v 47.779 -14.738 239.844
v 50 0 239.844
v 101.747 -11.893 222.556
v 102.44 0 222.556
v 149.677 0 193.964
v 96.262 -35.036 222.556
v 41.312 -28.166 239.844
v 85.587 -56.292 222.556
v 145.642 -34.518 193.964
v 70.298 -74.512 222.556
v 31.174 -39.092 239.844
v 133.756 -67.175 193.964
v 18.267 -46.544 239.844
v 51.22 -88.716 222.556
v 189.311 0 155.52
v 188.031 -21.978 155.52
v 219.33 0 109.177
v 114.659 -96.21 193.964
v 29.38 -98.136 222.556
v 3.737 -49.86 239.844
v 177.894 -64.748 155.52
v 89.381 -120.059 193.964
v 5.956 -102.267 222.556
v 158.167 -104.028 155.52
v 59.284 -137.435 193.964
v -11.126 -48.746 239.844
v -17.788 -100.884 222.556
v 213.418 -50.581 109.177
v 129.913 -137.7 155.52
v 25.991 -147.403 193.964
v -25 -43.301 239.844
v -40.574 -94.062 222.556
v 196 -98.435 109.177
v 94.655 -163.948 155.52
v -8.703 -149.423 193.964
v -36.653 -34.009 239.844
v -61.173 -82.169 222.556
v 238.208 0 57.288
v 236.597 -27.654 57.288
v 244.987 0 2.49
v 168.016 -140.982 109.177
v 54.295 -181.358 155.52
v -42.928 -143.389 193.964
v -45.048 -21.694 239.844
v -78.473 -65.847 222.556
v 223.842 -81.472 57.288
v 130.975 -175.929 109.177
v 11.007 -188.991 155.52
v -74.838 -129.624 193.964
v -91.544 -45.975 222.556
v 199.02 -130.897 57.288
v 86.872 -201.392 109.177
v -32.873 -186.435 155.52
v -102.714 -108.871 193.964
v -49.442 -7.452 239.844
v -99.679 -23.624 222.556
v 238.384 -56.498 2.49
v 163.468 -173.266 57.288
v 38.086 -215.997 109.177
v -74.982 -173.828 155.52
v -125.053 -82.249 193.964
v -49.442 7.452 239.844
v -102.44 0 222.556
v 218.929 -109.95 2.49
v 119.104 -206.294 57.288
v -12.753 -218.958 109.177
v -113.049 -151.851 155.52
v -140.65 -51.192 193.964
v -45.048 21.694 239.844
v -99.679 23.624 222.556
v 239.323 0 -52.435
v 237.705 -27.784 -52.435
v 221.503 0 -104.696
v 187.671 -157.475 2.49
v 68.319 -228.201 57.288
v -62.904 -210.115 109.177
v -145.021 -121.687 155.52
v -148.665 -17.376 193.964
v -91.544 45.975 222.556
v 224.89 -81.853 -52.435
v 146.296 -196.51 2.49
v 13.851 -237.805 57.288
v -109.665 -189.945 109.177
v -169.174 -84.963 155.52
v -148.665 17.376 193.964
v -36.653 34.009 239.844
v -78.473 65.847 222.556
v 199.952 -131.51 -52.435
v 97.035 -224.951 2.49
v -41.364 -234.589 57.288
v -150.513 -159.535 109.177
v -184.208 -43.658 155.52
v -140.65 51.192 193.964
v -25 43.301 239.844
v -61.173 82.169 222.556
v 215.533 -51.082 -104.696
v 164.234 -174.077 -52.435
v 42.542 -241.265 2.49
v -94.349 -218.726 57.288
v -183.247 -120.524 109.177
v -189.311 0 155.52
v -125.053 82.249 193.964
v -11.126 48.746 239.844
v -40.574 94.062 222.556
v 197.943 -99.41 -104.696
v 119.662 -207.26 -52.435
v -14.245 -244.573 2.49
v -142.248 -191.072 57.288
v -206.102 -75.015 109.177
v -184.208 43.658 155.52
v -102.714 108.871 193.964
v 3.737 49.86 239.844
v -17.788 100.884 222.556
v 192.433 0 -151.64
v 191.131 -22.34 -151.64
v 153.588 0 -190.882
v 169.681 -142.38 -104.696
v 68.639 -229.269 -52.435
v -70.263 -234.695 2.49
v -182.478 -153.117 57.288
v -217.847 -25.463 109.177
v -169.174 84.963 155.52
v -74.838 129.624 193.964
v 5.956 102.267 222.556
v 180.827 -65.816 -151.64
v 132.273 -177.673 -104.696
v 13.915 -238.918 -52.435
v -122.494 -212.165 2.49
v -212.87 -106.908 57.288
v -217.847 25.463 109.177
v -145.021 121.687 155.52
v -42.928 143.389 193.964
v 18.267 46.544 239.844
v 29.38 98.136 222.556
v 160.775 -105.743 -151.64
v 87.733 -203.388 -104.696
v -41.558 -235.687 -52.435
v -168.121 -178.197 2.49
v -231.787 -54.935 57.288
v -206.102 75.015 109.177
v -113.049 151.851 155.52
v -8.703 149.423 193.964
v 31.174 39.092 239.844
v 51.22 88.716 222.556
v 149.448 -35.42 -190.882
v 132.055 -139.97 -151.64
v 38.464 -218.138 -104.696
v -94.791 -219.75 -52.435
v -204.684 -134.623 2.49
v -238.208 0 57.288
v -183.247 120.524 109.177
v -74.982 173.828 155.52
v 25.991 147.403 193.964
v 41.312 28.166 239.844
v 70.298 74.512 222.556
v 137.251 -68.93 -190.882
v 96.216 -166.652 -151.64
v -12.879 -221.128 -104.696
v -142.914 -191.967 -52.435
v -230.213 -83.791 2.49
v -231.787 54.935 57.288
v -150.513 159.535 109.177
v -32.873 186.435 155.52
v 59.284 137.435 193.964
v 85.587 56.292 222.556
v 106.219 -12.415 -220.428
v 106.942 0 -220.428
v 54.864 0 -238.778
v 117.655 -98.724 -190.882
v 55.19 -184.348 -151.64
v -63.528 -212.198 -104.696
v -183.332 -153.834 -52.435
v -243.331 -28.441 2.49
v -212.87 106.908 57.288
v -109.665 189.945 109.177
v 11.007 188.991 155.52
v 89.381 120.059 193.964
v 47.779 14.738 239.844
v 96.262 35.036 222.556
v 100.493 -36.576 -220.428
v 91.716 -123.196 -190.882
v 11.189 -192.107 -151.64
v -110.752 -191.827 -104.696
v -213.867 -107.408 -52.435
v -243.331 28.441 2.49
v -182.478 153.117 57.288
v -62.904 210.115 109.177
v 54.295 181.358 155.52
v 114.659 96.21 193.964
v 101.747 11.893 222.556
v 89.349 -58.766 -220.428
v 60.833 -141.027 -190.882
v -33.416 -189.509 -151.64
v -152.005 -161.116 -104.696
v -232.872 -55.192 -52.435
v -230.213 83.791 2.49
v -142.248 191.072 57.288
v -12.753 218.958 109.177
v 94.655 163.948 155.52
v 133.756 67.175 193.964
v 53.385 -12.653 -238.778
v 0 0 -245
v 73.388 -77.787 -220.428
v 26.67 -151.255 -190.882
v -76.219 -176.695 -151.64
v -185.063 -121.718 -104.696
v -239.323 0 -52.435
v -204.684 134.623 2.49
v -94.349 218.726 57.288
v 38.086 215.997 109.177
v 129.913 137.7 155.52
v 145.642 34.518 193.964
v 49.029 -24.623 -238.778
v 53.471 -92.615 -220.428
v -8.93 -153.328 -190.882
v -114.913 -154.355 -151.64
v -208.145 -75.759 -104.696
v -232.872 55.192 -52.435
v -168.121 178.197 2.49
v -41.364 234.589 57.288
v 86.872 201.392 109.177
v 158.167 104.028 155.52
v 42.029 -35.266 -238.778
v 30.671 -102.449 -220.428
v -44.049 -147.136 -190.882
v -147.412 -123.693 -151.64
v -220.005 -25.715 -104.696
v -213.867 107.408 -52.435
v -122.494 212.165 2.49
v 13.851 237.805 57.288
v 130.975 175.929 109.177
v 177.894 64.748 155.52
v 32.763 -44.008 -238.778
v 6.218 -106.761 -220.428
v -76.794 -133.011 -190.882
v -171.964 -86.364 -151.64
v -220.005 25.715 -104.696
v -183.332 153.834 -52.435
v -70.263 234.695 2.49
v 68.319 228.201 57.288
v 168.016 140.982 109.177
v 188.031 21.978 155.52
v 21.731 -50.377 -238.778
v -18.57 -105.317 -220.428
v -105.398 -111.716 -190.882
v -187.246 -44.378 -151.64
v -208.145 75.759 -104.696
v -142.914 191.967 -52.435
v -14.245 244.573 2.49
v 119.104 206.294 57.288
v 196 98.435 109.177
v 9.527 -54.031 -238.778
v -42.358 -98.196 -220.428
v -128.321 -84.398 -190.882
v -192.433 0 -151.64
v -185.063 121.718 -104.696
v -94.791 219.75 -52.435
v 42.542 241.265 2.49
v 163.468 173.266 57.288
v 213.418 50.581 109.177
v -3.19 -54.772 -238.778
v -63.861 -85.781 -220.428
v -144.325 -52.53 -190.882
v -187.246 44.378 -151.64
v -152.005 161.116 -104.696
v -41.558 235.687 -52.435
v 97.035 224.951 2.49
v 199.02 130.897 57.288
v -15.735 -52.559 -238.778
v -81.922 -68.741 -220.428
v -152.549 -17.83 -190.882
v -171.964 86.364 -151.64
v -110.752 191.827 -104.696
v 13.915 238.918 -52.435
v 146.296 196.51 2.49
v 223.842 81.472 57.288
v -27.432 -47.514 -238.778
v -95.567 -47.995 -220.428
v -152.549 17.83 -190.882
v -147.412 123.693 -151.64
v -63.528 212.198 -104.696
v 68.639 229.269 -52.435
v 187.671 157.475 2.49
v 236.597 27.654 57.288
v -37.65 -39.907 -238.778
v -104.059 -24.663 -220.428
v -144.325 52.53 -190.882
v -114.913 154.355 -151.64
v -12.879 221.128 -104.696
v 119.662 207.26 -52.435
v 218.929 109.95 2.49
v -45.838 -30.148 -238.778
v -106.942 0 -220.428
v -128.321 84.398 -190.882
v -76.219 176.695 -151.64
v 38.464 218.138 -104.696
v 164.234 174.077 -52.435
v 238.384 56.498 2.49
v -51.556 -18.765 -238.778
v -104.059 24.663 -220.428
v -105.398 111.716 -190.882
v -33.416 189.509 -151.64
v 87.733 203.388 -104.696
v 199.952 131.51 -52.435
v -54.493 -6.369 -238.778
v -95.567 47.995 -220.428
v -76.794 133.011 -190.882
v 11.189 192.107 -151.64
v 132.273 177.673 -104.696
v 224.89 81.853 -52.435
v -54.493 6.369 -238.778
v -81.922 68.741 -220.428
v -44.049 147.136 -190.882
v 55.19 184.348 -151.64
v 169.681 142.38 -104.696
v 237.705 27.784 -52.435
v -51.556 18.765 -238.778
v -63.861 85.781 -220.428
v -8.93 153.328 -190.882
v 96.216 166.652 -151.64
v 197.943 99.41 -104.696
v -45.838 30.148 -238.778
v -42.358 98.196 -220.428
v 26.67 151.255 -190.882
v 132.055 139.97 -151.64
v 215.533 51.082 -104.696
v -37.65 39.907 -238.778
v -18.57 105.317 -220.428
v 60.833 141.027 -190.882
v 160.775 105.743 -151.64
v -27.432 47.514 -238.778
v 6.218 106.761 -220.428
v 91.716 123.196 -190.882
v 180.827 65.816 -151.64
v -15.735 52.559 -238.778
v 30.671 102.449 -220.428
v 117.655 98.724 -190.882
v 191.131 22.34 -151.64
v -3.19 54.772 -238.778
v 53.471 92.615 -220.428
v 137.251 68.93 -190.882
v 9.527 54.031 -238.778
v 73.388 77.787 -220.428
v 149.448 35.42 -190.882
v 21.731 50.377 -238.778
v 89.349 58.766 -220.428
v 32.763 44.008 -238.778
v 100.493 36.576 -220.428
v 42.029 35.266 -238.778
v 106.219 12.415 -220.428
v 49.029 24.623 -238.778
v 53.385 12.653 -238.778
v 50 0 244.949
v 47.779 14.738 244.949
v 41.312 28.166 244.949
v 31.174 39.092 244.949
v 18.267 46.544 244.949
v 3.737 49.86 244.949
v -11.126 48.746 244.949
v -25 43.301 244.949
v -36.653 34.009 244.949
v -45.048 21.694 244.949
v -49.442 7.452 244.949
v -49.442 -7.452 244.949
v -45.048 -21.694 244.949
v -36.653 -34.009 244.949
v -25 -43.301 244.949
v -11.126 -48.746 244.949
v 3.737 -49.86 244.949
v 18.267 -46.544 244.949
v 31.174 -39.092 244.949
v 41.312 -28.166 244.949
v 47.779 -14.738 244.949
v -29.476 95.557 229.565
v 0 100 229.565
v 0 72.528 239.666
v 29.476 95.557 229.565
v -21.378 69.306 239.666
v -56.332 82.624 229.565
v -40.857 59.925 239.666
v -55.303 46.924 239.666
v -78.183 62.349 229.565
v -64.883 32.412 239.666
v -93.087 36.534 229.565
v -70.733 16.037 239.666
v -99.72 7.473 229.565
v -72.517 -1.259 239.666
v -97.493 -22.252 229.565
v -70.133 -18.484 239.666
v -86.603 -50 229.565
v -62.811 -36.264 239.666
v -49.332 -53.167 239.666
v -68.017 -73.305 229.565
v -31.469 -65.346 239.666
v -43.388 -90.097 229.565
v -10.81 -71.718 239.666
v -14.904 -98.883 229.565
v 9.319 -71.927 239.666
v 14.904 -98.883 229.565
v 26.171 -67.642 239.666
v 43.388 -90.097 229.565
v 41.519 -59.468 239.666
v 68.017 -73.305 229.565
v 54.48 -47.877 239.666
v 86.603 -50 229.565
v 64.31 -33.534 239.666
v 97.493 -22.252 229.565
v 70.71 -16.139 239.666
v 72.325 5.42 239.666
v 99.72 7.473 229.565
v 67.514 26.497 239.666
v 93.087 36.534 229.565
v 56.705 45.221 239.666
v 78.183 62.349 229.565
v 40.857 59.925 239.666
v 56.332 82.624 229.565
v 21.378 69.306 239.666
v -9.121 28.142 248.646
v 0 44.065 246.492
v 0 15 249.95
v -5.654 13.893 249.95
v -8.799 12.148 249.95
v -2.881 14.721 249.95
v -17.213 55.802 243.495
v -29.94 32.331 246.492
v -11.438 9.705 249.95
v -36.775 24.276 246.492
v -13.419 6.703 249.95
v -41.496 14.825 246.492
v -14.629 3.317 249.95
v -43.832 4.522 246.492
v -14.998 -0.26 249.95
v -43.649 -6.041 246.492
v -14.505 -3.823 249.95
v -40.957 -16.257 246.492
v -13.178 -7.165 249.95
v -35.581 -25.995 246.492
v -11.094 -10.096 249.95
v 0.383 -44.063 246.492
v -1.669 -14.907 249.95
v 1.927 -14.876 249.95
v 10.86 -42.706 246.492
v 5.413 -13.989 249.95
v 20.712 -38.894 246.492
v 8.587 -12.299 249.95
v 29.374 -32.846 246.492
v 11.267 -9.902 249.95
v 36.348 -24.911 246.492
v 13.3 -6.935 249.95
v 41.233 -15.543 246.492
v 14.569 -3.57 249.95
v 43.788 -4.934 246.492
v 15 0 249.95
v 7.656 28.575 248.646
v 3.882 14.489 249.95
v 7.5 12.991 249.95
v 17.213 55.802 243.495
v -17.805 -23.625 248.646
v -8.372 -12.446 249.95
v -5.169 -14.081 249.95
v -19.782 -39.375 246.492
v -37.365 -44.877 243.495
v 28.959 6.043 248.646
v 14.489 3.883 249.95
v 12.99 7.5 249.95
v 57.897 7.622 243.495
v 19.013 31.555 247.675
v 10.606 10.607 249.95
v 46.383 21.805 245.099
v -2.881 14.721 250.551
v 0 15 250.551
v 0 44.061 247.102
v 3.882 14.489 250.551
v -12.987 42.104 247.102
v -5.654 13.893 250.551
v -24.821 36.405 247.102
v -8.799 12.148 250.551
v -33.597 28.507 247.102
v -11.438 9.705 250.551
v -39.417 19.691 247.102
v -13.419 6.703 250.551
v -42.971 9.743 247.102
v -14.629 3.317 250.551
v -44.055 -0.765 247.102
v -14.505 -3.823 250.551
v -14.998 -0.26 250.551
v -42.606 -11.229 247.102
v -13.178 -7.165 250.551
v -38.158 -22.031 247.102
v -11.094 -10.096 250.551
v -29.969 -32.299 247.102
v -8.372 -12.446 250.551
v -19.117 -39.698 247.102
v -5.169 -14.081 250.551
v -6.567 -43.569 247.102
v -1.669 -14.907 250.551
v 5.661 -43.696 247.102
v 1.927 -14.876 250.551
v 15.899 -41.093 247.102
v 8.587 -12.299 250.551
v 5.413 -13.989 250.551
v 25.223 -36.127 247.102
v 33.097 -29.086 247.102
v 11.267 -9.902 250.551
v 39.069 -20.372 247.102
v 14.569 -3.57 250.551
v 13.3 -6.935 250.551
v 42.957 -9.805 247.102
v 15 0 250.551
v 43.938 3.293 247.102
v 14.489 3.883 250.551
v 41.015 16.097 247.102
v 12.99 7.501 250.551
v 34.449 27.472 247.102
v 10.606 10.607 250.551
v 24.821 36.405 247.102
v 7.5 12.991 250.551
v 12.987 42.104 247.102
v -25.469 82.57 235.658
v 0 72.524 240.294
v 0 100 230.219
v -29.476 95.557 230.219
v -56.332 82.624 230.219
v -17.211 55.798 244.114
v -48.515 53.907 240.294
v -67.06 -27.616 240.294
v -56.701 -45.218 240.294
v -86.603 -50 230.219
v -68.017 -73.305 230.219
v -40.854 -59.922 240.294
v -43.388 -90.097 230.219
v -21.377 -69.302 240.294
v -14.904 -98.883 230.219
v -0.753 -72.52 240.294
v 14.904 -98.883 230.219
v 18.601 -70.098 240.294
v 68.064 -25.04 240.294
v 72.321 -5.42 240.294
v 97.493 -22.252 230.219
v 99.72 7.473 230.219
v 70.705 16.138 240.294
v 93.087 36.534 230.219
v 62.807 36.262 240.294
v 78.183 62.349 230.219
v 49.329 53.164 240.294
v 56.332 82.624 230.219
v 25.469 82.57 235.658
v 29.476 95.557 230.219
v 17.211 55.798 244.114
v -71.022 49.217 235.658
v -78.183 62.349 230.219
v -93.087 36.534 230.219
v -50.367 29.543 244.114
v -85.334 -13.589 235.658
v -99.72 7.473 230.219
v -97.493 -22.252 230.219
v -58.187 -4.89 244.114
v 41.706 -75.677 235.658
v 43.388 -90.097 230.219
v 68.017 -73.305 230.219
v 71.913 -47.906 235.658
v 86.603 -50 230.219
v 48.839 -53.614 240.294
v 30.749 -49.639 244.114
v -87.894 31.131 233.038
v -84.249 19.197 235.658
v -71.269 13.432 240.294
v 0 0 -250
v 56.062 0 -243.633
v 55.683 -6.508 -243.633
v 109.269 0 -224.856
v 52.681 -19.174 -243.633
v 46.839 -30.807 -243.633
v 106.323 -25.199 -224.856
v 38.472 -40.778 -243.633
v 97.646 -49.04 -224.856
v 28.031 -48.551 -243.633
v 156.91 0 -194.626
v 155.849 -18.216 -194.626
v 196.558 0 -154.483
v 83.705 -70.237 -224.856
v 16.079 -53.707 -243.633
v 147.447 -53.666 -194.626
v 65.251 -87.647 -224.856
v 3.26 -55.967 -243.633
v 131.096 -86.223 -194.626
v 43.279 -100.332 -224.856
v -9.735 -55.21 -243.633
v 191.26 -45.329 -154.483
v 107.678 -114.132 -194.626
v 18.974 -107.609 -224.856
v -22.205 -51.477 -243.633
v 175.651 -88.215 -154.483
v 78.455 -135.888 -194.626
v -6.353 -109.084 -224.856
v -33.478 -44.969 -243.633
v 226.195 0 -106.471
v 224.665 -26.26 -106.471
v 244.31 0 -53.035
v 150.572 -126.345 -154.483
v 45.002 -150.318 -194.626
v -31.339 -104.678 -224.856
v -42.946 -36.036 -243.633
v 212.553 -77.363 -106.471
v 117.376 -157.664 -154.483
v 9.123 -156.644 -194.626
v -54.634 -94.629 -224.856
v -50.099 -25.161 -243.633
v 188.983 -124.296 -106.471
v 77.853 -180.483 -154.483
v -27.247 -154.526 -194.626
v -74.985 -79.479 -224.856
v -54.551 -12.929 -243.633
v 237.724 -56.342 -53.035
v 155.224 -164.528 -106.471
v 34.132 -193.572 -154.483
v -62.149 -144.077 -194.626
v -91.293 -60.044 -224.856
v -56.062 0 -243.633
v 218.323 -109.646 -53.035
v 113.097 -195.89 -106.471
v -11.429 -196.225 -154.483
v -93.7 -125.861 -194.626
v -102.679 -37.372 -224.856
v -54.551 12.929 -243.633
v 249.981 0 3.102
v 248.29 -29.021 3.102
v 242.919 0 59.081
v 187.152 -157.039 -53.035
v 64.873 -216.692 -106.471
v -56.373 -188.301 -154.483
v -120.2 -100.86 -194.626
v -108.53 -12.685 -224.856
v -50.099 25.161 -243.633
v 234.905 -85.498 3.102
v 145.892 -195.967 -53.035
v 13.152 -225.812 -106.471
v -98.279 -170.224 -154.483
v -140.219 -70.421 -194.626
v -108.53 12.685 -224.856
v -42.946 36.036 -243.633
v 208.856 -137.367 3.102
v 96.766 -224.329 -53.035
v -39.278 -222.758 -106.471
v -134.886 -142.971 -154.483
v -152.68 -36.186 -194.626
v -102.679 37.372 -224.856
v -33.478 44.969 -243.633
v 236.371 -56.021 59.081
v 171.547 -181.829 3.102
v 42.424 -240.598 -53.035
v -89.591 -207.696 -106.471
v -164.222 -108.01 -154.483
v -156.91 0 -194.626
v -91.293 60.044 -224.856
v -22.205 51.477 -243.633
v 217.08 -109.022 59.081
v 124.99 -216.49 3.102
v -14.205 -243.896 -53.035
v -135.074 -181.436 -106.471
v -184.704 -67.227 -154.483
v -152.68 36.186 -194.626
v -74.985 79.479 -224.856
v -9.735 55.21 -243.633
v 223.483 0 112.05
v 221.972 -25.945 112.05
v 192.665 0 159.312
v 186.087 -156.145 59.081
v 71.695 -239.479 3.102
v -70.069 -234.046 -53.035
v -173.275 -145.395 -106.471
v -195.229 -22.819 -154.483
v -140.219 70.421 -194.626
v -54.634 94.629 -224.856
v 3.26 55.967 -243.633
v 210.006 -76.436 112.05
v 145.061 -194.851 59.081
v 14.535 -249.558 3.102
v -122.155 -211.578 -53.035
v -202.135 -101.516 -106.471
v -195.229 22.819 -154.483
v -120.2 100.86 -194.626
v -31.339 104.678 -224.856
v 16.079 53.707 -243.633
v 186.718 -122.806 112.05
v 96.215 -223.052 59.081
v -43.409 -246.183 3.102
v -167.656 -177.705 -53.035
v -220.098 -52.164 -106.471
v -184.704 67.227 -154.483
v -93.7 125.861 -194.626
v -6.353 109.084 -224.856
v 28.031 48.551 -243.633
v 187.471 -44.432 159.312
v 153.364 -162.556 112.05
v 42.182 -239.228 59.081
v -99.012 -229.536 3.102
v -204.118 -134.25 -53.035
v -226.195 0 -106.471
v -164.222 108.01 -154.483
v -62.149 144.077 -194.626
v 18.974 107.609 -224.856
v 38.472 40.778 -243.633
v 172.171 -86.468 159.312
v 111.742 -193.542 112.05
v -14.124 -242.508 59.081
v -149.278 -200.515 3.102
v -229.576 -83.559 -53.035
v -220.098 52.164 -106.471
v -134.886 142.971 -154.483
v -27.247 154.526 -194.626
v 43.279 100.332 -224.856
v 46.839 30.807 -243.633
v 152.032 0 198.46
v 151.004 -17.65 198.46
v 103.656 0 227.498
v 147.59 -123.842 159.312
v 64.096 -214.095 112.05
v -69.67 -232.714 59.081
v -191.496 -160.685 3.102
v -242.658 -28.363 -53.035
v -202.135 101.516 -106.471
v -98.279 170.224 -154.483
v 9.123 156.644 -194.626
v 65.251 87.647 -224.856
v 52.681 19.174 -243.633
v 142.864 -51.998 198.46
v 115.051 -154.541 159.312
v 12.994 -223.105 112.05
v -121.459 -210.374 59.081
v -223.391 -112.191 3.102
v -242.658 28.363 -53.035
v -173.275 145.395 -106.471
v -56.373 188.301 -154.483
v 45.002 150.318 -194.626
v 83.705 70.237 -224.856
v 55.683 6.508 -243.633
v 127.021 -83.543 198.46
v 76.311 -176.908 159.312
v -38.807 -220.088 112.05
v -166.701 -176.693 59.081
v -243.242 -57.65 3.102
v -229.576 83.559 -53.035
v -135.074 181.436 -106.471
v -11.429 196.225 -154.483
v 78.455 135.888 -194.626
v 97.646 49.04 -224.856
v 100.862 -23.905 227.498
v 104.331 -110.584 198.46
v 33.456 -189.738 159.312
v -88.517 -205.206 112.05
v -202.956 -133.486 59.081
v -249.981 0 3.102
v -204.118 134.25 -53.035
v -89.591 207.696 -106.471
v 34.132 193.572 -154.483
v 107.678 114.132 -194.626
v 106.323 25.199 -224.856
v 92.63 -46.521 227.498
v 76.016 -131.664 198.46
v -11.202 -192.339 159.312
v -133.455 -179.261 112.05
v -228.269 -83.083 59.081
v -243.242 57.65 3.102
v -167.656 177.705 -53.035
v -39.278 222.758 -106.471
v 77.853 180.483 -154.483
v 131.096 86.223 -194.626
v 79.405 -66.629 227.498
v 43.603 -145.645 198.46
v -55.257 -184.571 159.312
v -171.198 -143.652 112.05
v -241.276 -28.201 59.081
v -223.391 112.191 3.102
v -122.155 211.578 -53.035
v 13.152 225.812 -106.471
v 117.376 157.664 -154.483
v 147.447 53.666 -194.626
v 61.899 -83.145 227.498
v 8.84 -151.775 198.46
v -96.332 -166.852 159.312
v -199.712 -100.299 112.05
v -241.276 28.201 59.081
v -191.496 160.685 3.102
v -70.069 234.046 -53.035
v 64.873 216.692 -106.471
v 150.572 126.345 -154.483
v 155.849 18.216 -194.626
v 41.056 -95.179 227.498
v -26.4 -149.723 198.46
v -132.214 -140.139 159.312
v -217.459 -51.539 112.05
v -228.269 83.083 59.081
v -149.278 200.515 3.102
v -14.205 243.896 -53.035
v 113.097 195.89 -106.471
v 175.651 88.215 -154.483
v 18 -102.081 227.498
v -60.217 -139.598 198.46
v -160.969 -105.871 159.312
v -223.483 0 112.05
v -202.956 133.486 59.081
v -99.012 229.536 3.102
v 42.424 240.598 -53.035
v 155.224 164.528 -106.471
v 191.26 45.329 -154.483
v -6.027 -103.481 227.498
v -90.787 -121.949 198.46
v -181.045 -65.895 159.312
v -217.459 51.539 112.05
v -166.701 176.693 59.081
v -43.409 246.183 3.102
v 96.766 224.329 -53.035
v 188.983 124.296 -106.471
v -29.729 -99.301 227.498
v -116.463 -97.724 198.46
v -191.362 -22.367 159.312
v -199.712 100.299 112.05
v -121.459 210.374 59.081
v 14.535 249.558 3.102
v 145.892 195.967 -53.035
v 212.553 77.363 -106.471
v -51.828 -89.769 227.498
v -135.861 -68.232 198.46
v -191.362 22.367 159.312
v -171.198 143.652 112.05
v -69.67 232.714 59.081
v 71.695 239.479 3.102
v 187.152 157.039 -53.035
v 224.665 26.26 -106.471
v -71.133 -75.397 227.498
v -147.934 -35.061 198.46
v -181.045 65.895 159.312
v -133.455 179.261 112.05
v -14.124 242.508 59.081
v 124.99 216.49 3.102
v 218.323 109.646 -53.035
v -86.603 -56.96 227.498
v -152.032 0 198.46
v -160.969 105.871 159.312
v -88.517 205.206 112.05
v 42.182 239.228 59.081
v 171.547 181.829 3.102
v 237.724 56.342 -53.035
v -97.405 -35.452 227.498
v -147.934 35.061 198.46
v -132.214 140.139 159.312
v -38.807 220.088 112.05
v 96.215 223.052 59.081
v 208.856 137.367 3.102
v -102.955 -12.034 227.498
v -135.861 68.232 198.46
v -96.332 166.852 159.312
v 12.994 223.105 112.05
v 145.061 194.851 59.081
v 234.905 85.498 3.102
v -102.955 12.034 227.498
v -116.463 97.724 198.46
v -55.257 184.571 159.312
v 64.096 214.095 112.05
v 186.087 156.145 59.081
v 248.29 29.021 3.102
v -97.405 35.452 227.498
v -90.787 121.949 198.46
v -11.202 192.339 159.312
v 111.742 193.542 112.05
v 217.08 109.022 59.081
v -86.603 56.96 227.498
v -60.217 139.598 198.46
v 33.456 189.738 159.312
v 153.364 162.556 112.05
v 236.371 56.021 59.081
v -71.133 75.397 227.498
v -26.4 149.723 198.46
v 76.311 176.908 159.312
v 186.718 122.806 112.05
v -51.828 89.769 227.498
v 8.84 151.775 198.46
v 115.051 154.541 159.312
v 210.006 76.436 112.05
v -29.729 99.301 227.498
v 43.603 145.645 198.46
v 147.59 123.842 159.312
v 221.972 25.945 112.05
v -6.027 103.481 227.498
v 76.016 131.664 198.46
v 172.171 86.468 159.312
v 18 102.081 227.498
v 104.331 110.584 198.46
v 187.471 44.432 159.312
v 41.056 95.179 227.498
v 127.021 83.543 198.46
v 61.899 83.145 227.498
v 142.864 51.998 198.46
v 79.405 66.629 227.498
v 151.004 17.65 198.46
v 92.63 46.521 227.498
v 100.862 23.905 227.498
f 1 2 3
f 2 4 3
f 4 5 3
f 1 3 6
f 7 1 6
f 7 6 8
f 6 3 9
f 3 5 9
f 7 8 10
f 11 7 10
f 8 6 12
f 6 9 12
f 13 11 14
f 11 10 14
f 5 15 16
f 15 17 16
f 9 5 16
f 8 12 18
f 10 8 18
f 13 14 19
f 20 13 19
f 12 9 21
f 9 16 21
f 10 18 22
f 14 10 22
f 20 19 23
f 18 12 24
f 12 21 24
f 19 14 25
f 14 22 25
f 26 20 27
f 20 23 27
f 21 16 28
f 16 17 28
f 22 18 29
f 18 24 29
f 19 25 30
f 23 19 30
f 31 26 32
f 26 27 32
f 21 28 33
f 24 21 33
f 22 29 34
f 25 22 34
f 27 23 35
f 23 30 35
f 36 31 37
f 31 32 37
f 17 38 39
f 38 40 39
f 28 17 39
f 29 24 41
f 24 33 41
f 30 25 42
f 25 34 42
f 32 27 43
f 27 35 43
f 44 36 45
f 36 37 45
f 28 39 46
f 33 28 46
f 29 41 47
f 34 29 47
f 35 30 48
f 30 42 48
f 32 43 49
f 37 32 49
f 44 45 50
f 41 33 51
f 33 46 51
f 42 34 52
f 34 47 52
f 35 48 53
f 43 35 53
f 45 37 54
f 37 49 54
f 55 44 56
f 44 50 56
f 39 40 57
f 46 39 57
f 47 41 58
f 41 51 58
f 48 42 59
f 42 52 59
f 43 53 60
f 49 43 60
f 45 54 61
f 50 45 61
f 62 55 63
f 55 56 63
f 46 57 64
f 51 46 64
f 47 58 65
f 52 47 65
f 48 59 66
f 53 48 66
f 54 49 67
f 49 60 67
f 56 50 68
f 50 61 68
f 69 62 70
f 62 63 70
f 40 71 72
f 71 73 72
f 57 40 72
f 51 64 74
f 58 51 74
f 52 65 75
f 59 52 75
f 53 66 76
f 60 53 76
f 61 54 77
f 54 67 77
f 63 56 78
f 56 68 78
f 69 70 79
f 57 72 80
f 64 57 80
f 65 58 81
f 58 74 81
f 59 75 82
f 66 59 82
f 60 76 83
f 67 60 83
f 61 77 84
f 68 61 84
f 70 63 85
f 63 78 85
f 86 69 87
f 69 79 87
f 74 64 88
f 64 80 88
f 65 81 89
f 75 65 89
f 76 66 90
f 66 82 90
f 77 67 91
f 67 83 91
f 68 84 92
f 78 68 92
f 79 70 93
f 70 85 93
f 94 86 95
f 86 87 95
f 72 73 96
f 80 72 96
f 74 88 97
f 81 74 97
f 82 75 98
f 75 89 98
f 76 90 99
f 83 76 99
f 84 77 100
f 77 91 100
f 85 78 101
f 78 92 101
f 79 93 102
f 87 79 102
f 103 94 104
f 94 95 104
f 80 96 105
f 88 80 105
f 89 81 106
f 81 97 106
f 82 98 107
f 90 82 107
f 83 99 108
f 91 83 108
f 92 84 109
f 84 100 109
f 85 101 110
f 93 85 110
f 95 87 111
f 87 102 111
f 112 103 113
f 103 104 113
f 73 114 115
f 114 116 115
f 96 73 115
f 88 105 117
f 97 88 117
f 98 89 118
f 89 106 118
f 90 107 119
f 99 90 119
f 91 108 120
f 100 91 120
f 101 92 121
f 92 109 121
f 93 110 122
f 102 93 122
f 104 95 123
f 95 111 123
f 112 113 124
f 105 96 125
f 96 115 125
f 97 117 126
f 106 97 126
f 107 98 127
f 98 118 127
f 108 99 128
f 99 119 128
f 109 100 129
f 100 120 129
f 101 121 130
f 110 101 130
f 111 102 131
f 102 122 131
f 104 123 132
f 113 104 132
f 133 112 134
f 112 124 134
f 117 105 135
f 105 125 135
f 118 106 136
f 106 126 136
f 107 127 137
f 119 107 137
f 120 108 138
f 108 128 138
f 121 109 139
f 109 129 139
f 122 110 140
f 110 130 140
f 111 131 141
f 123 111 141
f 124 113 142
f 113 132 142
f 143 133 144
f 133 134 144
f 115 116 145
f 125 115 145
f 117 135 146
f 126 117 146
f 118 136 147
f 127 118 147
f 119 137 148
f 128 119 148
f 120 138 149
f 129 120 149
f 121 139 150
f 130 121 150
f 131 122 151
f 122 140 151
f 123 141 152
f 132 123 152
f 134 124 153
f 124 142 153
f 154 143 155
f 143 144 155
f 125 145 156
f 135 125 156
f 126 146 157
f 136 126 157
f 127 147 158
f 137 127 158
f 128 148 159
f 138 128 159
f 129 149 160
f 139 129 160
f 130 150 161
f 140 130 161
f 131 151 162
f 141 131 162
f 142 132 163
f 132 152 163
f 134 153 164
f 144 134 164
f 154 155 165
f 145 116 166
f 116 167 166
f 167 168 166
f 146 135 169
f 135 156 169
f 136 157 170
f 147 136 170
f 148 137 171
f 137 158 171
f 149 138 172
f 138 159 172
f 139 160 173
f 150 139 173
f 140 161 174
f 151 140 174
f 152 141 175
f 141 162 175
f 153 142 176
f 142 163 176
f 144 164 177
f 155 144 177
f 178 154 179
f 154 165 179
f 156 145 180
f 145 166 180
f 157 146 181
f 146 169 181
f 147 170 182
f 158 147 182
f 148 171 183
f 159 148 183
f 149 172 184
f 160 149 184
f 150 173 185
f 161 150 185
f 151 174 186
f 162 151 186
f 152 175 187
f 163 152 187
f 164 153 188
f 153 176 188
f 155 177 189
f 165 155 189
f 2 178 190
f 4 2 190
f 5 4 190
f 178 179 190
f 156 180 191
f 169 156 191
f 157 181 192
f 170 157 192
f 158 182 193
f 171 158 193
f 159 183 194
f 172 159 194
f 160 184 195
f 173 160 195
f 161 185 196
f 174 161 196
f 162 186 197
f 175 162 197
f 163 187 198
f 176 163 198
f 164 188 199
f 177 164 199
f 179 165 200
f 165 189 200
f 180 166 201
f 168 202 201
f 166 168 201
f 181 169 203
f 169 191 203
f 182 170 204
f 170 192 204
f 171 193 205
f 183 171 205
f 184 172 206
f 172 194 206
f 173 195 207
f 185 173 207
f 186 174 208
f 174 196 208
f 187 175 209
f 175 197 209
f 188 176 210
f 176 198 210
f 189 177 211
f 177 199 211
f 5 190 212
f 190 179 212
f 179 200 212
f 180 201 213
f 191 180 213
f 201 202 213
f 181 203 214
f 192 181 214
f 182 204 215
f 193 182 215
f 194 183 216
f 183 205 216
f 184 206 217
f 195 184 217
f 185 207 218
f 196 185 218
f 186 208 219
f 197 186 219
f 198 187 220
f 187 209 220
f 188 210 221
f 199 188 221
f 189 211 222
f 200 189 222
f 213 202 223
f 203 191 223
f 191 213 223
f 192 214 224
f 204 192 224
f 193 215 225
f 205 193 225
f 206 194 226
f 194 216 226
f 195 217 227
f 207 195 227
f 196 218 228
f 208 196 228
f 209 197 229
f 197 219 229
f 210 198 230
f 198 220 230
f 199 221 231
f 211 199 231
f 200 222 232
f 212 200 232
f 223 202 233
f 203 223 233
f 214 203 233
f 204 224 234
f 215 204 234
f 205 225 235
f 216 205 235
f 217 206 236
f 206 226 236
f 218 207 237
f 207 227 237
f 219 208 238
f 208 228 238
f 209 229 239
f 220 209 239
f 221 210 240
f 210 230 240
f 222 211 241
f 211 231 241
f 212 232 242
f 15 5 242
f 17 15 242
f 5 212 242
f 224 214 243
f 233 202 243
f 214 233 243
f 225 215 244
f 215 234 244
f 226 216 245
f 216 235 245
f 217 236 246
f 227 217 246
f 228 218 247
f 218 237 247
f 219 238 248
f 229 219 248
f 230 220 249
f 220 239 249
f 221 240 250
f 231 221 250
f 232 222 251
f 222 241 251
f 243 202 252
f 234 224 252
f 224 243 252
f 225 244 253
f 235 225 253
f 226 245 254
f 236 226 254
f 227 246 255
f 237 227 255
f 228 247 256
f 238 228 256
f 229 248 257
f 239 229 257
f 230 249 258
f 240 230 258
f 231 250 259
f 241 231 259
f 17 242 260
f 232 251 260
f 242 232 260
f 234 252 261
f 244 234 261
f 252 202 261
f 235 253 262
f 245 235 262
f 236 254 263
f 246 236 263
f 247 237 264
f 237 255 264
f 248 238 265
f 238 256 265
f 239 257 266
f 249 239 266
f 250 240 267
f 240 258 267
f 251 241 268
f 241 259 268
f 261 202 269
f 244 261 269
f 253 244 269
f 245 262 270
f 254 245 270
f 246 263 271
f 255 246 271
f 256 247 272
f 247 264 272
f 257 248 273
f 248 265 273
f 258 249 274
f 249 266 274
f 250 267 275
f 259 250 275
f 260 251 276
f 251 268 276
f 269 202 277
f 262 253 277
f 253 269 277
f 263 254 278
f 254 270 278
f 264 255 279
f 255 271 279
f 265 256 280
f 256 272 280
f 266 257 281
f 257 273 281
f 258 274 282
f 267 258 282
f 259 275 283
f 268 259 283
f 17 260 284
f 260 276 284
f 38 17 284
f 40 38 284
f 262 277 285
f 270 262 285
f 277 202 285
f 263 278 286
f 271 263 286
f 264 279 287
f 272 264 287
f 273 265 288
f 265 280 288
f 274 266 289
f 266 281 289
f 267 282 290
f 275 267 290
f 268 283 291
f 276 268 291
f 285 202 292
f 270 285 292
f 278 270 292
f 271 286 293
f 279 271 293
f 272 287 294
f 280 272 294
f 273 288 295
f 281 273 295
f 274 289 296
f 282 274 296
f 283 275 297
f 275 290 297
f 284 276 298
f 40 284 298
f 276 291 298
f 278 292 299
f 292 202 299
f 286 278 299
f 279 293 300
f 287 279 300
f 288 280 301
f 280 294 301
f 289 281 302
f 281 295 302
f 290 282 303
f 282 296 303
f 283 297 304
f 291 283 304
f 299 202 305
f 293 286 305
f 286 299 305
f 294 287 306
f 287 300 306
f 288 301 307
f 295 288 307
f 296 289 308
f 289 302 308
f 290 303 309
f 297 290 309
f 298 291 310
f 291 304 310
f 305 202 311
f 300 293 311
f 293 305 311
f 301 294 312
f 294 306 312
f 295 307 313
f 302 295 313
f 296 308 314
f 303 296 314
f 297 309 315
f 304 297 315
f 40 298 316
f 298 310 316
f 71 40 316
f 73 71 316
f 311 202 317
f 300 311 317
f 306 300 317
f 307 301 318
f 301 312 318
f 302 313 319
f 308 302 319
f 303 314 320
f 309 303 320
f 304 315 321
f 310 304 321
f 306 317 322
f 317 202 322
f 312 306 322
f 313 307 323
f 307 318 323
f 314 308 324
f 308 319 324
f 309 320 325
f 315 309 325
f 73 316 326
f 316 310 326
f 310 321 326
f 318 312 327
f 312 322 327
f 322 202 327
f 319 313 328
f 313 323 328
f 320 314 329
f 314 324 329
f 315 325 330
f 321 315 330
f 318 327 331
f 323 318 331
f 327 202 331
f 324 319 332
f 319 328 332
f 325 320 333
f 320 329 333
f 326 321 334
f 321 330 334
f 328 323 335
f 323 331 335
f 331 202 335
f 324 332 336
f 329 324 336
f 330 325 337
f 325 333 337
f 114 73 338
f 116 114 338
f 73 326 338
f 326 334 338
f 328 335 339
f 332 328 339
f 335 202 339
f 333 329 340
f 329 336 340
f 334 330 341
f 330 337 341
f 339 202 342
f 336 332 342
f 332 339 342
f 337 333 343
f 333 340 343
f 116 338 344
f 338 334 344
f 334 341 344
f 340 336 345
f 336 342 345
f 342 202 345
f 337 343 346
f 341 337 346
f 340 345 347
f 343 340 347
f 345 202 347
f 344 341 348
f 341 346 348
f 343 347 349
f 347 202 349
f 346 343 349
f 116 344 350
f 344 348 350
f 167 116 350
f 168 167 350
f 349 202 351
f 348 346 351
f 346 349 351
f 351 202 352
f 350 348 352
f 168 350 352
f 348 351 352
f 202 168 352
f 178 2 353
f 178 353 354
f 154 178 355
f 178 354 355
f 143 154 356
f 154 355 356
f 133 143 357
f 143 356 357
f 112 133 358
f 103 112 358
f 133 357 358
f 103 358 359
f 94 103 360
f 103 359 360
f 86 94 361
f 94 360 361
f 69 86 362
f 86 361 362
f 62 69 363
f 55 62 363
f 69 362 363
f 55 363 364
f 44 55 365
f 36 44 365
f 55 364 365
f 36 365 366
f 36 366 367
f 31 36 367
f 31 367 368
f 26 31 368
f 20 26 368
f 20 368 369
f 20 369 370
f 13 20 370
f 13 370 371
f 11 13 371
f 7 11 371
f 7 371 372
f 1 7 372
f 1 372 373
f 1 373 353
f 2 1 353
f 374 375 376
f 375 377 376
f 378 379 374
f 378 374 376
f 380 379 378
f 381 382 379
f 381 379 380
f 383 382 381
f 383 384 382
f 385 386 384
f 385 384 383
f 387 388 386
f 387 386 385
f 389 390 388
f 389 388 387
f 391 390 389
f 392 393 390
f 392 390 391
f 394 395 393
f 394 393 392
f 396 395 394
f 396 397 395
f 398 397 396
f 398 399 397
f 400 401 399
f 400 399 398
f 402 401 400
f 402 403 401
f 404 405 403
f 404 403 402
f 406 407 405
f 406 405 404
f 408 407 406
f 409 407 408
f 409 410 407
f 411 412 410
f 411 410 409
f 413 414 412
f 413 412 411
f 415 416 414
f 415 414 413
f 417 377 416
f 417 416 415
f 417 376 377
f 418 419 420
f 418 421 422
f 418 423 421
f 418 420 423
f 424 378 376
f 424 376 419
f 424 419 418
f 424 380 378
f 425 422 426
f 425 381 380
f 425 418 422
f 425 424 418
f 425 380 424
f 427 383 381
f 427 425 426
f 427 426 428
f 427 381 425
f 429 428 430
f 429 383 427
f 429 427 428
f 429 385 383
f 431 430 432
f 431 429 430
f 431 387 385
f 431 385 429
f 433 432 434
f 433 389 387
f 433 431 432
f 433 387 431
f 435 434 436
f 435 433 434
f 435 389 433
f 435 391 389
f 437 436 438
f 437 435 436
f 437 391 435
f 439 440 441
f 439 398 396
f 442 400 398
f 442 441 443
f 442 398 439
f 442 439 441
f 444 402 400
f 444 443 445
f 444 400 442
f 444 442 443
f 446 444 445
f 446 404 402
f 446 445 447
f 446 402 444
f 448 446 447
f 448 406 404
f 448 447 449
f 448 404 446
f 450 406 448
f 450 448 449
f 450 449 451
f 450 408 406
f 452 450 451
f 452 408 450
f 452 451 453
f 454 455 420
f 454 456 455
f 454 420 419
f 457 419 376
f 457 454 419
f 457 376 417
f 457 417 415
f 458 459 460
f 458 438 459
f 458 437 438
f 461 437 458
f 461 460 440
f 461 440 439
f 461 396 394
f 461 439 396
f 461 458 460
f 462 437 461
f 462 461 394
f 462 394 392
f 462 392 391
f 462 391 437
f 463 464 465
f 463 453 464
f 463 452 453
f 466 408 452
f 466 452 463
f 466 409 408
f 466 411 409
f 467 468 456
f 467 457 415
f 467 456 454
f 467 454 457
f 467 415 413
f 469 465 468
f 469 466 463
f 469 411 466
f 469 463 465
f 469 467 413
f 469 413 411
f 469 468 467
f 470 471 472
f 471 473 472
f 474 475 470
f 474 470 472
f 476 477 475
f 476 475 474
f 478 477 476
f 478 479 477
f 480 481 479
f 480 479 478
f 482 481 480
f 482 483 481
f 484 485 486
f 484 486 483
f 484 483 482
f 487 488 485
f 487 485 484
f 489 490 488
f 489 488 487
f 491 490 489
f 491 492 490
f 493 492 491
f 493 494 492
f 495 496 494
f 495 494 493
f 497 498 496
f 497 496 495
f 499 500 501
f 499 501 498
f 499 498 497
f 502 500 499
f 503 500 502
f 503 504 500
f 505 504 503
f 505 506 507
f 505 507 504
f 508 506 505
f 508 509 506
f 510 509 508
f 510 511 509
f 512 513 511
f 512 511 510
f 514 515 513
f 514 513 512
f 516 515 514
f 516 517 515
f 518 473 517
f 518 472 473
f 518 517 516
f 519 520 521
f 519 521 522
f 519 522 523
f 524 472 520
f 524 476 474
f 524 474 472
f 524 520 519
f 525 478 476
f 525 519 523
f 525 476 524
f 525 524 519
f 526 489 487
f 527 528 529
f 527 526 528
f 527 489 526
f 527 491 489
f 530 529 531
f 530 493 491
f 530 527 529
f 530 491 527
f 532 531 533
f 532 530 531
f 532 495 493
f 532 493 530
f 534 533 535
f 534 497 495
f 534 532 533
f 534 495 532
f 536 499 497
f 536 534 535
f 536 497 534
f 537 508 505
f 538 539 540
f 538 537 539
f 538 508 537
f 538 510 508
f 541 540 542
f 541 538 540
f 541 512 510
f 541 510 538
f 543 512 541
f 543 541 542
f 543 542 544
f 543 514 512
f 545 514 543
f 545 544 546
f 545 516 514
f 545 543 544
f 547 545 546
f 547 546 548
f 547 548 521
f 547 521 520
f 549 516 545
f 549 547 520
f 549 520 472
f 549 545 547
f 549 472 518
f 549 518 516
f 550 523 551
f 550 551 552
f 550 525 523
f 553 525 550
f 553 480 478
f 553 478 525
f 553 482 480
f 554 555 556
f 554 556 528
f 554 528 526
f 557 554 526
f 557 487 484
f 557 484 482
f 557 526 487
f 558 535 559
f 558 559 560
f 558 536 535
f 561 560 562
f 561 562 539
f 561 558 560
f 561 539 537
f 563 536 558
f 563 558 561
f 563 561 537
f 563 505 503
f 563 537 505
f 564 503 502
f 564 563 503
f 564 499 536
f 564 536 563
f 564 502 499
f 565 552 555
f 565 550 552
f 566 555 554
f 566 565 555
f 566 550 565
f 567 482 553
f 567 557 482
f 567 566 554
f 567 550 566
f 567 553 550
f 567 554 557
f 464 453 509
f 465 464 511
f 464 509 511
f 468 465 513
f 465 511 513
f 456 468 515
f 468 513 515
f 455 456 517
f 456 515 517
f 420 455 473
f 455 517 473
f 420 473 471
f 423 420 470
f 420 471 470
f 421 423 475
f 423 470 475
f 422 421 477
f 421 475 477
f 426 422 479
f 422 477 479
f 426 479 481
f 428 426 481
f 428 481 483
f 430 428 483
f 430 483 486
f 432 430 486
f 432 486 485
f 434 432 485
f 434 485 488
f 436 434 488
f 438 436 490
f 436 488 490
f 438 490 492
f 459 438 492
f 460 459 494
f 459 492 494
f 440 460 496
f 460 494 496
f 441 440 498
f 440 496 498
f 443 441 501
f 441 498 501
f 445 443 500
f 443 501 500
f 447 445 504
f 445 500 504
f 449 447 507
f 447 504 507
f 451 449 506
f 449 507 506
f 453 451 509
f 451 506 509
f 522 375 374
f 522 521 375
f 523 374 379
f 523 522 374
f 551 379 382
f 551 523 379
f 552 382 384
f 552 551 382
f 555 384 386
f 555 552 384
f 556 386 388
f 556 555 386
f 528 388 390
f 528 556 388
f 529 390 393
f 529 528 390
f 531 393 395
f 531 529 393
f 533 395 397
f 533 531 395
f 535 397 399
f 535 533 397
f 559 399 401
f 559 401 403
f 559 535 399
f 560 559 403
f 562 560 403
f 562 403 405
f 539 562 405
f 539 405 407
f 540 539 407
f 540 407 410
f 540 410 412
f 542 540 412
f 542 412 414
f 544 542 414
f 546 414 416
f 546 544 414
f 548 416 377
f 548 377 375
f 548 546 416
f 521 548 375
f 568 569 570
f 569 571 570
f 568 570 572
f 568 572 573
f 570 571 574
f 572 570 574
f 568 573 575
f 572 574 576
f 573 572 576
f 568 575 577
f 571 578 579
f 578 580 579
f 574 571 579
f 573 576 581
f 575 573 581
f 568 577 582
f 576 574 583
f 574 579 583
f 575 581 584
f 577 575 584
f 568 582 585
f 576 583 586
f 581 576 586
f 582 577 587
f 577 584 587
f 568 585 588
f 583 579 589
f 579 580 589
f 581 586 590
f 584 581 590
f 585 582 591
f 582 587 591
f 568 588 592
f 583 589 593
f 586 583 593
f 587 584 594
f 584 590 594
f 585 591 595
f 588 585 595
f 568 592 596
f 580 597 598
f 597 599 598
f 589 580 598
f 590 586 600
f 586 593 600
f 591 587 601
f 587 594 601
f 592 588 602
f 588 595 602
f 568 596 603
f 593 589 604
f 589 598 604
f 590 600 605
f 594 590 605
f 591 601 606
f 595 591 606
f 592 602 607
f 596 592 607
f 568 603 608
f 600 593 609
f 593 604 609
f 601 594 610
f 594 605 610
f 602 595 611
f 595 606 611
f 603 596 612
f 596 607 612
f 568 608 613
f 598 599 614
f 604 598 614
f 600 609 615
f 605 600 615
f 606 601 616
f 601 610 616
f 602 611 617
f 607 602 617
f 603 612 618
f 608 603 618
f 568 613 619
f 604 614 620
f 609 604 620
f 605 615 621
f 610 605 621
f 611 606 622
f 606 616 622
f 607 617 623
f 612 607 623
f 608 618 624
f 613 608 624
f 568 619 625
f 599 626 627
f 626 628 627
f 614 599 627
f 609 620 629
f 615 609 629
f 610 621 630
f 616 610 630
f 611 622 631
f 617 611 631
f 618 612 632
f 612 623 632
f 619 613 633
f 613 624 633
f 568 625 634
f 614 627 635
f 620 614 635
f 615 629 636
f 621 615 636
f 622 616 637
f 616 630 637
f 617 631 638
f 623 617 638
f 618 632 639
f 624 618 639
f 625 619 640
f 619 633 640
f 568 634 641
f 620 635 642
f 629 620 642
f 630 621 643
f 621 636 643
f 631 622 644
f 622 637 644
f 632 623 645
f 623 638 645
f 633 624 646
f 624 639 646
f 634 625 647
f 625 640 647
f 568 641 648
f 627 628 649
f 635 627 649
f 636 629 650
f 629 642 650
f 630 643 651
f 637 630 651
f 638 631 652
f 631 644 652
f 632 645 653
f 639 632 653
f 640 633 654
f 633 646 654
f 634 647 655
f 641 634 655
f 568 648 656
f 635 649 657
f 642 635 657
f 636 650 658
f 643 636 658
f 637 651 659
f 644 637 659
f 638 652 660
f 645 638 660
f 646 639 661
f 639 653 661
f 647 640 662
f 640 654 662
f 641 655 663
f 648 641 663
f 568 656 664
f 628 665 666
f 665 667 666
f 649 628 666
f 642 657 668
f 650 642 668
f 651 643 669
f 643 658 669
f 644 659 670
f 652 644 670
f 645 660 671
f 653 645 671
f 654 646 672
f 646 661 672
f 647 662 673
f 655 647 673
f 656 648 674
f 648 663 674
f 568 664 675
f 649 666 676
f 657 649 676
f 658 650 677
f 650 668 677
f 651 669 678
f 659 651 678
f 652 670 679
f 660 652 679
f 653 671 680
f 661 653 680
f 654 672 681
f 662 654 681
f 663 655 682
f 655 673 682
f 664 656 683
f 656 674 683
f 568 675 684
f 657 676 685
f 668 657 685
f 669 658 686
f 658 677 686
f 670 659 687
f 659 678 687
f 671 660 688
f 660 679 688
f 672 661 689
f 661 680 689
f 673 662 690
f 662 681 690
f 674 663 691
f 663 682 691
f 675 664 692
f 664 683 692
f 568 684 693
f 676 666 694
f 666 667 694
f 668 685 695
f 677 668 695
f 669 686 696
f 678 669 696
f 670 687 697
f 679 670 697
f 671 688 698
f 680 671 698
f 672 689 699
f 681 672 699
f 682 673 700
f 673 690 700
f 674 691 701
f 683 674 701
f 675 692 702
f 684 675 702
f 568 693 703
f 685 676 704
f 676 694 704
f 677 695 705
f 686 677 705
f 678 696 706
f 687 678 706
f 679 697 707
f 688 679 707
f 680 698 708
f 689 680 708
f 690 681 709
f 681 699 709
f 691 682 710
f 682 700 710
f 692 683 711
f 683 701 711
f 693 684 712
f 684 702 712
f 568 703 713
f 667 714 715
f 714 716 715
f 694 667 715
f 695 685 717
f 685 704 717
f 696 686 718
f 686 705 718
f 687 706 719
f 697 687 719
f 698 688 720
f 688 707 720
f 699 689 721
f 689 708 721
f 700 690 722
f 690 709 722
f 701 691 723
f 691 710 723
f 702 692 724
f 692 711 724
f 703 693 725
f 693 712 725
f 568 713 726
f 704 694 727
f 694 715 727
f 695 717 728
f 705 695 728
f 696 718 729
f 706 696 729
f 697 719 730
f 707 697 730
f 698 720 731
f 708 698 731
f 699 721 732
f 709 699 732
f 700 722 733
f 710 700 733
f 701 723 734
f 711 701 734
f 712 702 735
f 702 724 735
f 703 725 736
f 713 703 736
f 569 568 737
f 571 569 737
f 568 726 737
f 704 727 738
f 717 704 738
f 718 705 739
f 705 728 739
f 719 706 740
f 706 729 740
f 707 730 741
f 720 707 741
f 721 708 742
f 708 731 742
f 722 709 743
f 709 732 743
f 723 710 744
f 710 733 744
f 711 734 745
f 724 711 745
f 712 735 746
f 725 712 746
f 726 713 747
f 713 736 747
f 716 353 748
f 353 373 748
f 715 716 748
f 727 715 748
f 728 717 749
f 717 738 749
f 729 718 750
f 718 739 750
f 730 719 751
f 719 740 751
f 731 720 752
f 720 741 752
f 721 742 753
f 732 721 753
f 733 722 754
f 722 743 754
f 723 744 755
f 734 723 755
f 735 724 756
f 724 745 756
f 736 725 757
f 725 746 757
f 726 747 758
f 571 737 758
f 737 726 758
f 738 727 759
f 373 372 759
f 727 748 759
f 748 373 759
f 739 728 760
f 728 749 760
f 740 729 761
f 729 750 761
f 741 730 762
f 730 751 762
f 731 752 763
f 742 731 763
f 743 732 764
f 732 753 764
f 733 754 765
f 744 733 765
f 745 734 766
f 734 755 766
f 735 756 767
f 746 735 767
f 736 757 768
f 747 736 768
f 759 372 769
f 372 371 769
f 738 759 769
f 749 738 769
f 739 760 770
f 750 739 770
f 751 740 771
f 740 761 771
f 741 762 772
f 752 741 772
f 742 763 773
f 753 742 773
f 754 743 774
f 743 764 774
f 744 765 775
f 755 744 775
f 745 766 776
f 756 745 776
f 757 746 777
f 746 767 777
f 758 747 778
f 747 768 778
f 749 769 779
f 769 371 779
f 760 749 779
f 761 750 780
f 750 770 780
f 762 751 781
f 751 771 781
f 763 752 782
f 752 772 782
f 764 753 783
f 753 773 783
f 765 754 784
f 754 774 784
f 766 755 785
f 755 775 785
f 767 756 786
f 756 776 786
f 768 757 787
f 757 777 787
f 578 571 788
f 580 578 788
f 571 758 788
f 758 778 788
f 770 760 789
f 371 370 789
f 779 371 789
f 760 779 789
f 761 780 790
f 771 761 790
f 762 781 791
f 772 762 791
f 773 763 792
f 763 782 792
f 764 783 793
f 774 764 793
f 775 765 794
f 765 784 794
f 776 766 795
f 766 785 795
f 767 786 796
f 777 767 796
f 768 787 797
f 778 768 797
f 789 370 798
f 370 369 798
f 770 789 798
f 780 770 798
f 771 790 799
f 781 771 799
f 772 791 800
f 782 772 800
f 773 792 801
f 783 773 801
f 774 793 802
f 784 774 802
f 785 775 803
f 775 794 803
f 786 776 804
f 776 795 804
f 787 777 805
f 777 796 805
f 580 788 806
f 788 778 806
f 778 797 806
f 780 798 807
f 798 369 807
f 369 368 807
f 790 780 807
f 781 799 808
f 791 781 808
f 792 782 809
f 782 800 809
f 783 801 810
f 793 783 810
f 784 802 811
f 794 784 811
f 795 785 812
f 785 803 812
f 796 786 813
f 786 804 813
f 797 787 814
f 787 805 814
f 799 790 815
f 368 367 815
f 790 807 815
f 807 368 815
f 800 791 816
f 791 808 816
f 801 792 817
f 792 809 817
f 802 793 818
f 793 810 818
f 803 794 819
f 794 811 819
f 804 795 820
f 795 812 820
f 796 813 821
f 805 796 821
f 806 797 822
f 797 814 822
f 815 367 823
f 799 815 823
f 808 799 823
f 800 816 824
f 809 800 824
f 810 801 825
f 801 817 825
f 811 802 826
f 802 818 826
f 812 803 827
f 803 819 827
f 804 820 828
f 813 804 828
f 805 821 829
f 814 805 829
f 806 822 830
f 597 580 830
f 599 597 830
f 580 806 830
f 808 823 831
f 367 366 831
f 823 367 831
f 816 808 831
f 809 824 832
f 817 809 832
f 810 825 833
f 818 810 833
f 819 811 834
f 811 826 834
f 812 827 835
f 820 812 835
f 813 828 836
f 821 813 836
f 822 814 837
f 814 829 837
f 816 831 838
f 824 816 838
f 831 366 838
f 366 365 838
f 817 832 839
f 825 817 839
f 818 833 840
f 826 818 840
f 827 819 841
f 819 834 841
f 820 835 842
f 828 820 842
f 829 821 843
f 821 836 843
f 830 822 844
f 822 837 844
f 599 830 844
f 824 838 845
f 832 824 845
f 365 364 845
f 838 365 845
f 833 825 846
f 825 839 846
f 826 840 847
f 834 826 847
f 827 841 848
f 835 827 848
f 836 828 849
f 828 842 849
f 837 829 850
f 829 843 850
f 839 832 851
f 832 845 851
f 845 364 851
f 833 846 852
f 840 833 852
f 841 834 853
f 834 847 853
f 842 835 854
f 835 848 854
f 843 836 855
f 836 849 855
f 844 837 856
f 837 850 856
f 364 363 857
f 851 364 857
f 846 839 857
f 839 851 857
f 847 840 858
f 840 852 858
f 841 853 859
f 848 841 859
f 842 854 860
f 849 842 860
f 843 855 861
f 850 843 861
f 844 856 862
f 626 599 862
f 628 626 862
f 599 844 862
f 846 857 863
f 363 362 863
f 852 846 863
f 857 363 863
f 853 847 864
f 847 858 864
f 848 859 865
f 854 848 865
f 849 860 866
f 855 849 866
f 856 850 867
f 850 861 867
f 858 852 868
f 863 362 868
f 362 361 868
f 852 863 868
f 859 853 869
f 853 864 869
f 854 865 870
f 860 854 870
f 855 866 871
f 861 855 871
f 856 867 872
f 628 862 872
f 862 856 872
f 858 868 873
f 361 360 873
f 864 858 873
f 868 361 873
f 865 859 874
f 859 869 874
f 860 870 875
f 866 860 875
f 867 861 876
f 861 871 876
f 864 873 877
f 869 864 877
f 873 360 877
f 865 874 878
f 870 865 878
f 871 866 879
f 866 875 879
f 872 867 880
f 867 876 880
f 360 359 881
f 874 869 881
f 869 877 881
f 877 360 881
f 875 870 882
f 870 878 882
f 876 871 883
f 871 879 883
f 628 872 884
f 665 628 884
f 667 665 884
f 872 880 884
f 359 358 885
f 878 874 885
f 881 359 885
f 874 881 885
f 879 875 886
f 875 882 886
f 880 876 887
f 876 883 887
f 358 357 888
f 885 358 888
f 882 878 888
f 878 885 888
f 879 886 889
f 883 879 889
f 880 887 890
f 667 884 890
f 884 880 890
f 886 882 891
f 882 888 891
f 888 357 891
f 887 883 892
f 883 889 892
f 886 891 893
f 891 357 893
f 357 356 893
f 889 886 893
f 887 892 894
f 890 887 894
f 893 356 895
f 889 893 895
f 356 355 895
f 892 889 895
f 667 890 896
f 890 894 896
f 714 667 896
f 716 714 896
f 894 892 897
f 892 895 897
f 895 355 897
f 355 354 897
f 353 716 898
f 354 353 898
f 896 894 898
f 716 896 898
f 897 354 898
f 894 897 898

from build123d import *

# Parameters (mm, degrees)
F3_R     = 50
F4_DEPTH = 76.2
F8_R     = 15
F9_DEPTH = 114.3


with BuildPart() as f1:
    # F0 (on Front) → F1 (revolve)
    with BuildSketch(Plane.XZ):
        with BuildLine():
            Line((0, -245), (0, -250))
            ThreePointArc((0, -250), (250, 0), (0, 250))
            Line((0, 250), (0, 245))
            ThreePointArc((0, 245), (245, 0), (0, -245))
        make_face()
    revolve(axis=Axis((0, 0, 257.264091), (0, 0, -1)))

    # F3 (on offset) → F4 (cut)
    with BuildSketch(Plane.XY.offset(264.16)):
        Circle(F3_R)
    extrude(amount=-F4_DEPTH, mode=Mode.SUBTRACT)


with BuildPart() as f6:
    # F5 (on Right) → F6 (revolve)
    with BuildSketch(Plane.YZ):
        with BuildLine():
            Line((0, 251), (0, 250.4))
            ThreePointArc((0, 250.4), (51.073699, 245.135957), (100, 229.565154))
            Line((100, 229.565154), (100, 230.219461))
            ThreePointArc((100, 230.219461), (51.068167, 245.749959), (0, 251))
        make_face()
    revolve(axis=Axis((0, 0, 266.6693), (0, 0, 1)))

    # F8 (on offset) → F9 (cut)
    with BuildSketch(Plane.XY.offset(316.23)):
        Circle(F8_R)
    extrude(amount=-F9_DEPTH, mode=Mode.SUBTRACT)


solid = Compound([f1.part, f6.part])
